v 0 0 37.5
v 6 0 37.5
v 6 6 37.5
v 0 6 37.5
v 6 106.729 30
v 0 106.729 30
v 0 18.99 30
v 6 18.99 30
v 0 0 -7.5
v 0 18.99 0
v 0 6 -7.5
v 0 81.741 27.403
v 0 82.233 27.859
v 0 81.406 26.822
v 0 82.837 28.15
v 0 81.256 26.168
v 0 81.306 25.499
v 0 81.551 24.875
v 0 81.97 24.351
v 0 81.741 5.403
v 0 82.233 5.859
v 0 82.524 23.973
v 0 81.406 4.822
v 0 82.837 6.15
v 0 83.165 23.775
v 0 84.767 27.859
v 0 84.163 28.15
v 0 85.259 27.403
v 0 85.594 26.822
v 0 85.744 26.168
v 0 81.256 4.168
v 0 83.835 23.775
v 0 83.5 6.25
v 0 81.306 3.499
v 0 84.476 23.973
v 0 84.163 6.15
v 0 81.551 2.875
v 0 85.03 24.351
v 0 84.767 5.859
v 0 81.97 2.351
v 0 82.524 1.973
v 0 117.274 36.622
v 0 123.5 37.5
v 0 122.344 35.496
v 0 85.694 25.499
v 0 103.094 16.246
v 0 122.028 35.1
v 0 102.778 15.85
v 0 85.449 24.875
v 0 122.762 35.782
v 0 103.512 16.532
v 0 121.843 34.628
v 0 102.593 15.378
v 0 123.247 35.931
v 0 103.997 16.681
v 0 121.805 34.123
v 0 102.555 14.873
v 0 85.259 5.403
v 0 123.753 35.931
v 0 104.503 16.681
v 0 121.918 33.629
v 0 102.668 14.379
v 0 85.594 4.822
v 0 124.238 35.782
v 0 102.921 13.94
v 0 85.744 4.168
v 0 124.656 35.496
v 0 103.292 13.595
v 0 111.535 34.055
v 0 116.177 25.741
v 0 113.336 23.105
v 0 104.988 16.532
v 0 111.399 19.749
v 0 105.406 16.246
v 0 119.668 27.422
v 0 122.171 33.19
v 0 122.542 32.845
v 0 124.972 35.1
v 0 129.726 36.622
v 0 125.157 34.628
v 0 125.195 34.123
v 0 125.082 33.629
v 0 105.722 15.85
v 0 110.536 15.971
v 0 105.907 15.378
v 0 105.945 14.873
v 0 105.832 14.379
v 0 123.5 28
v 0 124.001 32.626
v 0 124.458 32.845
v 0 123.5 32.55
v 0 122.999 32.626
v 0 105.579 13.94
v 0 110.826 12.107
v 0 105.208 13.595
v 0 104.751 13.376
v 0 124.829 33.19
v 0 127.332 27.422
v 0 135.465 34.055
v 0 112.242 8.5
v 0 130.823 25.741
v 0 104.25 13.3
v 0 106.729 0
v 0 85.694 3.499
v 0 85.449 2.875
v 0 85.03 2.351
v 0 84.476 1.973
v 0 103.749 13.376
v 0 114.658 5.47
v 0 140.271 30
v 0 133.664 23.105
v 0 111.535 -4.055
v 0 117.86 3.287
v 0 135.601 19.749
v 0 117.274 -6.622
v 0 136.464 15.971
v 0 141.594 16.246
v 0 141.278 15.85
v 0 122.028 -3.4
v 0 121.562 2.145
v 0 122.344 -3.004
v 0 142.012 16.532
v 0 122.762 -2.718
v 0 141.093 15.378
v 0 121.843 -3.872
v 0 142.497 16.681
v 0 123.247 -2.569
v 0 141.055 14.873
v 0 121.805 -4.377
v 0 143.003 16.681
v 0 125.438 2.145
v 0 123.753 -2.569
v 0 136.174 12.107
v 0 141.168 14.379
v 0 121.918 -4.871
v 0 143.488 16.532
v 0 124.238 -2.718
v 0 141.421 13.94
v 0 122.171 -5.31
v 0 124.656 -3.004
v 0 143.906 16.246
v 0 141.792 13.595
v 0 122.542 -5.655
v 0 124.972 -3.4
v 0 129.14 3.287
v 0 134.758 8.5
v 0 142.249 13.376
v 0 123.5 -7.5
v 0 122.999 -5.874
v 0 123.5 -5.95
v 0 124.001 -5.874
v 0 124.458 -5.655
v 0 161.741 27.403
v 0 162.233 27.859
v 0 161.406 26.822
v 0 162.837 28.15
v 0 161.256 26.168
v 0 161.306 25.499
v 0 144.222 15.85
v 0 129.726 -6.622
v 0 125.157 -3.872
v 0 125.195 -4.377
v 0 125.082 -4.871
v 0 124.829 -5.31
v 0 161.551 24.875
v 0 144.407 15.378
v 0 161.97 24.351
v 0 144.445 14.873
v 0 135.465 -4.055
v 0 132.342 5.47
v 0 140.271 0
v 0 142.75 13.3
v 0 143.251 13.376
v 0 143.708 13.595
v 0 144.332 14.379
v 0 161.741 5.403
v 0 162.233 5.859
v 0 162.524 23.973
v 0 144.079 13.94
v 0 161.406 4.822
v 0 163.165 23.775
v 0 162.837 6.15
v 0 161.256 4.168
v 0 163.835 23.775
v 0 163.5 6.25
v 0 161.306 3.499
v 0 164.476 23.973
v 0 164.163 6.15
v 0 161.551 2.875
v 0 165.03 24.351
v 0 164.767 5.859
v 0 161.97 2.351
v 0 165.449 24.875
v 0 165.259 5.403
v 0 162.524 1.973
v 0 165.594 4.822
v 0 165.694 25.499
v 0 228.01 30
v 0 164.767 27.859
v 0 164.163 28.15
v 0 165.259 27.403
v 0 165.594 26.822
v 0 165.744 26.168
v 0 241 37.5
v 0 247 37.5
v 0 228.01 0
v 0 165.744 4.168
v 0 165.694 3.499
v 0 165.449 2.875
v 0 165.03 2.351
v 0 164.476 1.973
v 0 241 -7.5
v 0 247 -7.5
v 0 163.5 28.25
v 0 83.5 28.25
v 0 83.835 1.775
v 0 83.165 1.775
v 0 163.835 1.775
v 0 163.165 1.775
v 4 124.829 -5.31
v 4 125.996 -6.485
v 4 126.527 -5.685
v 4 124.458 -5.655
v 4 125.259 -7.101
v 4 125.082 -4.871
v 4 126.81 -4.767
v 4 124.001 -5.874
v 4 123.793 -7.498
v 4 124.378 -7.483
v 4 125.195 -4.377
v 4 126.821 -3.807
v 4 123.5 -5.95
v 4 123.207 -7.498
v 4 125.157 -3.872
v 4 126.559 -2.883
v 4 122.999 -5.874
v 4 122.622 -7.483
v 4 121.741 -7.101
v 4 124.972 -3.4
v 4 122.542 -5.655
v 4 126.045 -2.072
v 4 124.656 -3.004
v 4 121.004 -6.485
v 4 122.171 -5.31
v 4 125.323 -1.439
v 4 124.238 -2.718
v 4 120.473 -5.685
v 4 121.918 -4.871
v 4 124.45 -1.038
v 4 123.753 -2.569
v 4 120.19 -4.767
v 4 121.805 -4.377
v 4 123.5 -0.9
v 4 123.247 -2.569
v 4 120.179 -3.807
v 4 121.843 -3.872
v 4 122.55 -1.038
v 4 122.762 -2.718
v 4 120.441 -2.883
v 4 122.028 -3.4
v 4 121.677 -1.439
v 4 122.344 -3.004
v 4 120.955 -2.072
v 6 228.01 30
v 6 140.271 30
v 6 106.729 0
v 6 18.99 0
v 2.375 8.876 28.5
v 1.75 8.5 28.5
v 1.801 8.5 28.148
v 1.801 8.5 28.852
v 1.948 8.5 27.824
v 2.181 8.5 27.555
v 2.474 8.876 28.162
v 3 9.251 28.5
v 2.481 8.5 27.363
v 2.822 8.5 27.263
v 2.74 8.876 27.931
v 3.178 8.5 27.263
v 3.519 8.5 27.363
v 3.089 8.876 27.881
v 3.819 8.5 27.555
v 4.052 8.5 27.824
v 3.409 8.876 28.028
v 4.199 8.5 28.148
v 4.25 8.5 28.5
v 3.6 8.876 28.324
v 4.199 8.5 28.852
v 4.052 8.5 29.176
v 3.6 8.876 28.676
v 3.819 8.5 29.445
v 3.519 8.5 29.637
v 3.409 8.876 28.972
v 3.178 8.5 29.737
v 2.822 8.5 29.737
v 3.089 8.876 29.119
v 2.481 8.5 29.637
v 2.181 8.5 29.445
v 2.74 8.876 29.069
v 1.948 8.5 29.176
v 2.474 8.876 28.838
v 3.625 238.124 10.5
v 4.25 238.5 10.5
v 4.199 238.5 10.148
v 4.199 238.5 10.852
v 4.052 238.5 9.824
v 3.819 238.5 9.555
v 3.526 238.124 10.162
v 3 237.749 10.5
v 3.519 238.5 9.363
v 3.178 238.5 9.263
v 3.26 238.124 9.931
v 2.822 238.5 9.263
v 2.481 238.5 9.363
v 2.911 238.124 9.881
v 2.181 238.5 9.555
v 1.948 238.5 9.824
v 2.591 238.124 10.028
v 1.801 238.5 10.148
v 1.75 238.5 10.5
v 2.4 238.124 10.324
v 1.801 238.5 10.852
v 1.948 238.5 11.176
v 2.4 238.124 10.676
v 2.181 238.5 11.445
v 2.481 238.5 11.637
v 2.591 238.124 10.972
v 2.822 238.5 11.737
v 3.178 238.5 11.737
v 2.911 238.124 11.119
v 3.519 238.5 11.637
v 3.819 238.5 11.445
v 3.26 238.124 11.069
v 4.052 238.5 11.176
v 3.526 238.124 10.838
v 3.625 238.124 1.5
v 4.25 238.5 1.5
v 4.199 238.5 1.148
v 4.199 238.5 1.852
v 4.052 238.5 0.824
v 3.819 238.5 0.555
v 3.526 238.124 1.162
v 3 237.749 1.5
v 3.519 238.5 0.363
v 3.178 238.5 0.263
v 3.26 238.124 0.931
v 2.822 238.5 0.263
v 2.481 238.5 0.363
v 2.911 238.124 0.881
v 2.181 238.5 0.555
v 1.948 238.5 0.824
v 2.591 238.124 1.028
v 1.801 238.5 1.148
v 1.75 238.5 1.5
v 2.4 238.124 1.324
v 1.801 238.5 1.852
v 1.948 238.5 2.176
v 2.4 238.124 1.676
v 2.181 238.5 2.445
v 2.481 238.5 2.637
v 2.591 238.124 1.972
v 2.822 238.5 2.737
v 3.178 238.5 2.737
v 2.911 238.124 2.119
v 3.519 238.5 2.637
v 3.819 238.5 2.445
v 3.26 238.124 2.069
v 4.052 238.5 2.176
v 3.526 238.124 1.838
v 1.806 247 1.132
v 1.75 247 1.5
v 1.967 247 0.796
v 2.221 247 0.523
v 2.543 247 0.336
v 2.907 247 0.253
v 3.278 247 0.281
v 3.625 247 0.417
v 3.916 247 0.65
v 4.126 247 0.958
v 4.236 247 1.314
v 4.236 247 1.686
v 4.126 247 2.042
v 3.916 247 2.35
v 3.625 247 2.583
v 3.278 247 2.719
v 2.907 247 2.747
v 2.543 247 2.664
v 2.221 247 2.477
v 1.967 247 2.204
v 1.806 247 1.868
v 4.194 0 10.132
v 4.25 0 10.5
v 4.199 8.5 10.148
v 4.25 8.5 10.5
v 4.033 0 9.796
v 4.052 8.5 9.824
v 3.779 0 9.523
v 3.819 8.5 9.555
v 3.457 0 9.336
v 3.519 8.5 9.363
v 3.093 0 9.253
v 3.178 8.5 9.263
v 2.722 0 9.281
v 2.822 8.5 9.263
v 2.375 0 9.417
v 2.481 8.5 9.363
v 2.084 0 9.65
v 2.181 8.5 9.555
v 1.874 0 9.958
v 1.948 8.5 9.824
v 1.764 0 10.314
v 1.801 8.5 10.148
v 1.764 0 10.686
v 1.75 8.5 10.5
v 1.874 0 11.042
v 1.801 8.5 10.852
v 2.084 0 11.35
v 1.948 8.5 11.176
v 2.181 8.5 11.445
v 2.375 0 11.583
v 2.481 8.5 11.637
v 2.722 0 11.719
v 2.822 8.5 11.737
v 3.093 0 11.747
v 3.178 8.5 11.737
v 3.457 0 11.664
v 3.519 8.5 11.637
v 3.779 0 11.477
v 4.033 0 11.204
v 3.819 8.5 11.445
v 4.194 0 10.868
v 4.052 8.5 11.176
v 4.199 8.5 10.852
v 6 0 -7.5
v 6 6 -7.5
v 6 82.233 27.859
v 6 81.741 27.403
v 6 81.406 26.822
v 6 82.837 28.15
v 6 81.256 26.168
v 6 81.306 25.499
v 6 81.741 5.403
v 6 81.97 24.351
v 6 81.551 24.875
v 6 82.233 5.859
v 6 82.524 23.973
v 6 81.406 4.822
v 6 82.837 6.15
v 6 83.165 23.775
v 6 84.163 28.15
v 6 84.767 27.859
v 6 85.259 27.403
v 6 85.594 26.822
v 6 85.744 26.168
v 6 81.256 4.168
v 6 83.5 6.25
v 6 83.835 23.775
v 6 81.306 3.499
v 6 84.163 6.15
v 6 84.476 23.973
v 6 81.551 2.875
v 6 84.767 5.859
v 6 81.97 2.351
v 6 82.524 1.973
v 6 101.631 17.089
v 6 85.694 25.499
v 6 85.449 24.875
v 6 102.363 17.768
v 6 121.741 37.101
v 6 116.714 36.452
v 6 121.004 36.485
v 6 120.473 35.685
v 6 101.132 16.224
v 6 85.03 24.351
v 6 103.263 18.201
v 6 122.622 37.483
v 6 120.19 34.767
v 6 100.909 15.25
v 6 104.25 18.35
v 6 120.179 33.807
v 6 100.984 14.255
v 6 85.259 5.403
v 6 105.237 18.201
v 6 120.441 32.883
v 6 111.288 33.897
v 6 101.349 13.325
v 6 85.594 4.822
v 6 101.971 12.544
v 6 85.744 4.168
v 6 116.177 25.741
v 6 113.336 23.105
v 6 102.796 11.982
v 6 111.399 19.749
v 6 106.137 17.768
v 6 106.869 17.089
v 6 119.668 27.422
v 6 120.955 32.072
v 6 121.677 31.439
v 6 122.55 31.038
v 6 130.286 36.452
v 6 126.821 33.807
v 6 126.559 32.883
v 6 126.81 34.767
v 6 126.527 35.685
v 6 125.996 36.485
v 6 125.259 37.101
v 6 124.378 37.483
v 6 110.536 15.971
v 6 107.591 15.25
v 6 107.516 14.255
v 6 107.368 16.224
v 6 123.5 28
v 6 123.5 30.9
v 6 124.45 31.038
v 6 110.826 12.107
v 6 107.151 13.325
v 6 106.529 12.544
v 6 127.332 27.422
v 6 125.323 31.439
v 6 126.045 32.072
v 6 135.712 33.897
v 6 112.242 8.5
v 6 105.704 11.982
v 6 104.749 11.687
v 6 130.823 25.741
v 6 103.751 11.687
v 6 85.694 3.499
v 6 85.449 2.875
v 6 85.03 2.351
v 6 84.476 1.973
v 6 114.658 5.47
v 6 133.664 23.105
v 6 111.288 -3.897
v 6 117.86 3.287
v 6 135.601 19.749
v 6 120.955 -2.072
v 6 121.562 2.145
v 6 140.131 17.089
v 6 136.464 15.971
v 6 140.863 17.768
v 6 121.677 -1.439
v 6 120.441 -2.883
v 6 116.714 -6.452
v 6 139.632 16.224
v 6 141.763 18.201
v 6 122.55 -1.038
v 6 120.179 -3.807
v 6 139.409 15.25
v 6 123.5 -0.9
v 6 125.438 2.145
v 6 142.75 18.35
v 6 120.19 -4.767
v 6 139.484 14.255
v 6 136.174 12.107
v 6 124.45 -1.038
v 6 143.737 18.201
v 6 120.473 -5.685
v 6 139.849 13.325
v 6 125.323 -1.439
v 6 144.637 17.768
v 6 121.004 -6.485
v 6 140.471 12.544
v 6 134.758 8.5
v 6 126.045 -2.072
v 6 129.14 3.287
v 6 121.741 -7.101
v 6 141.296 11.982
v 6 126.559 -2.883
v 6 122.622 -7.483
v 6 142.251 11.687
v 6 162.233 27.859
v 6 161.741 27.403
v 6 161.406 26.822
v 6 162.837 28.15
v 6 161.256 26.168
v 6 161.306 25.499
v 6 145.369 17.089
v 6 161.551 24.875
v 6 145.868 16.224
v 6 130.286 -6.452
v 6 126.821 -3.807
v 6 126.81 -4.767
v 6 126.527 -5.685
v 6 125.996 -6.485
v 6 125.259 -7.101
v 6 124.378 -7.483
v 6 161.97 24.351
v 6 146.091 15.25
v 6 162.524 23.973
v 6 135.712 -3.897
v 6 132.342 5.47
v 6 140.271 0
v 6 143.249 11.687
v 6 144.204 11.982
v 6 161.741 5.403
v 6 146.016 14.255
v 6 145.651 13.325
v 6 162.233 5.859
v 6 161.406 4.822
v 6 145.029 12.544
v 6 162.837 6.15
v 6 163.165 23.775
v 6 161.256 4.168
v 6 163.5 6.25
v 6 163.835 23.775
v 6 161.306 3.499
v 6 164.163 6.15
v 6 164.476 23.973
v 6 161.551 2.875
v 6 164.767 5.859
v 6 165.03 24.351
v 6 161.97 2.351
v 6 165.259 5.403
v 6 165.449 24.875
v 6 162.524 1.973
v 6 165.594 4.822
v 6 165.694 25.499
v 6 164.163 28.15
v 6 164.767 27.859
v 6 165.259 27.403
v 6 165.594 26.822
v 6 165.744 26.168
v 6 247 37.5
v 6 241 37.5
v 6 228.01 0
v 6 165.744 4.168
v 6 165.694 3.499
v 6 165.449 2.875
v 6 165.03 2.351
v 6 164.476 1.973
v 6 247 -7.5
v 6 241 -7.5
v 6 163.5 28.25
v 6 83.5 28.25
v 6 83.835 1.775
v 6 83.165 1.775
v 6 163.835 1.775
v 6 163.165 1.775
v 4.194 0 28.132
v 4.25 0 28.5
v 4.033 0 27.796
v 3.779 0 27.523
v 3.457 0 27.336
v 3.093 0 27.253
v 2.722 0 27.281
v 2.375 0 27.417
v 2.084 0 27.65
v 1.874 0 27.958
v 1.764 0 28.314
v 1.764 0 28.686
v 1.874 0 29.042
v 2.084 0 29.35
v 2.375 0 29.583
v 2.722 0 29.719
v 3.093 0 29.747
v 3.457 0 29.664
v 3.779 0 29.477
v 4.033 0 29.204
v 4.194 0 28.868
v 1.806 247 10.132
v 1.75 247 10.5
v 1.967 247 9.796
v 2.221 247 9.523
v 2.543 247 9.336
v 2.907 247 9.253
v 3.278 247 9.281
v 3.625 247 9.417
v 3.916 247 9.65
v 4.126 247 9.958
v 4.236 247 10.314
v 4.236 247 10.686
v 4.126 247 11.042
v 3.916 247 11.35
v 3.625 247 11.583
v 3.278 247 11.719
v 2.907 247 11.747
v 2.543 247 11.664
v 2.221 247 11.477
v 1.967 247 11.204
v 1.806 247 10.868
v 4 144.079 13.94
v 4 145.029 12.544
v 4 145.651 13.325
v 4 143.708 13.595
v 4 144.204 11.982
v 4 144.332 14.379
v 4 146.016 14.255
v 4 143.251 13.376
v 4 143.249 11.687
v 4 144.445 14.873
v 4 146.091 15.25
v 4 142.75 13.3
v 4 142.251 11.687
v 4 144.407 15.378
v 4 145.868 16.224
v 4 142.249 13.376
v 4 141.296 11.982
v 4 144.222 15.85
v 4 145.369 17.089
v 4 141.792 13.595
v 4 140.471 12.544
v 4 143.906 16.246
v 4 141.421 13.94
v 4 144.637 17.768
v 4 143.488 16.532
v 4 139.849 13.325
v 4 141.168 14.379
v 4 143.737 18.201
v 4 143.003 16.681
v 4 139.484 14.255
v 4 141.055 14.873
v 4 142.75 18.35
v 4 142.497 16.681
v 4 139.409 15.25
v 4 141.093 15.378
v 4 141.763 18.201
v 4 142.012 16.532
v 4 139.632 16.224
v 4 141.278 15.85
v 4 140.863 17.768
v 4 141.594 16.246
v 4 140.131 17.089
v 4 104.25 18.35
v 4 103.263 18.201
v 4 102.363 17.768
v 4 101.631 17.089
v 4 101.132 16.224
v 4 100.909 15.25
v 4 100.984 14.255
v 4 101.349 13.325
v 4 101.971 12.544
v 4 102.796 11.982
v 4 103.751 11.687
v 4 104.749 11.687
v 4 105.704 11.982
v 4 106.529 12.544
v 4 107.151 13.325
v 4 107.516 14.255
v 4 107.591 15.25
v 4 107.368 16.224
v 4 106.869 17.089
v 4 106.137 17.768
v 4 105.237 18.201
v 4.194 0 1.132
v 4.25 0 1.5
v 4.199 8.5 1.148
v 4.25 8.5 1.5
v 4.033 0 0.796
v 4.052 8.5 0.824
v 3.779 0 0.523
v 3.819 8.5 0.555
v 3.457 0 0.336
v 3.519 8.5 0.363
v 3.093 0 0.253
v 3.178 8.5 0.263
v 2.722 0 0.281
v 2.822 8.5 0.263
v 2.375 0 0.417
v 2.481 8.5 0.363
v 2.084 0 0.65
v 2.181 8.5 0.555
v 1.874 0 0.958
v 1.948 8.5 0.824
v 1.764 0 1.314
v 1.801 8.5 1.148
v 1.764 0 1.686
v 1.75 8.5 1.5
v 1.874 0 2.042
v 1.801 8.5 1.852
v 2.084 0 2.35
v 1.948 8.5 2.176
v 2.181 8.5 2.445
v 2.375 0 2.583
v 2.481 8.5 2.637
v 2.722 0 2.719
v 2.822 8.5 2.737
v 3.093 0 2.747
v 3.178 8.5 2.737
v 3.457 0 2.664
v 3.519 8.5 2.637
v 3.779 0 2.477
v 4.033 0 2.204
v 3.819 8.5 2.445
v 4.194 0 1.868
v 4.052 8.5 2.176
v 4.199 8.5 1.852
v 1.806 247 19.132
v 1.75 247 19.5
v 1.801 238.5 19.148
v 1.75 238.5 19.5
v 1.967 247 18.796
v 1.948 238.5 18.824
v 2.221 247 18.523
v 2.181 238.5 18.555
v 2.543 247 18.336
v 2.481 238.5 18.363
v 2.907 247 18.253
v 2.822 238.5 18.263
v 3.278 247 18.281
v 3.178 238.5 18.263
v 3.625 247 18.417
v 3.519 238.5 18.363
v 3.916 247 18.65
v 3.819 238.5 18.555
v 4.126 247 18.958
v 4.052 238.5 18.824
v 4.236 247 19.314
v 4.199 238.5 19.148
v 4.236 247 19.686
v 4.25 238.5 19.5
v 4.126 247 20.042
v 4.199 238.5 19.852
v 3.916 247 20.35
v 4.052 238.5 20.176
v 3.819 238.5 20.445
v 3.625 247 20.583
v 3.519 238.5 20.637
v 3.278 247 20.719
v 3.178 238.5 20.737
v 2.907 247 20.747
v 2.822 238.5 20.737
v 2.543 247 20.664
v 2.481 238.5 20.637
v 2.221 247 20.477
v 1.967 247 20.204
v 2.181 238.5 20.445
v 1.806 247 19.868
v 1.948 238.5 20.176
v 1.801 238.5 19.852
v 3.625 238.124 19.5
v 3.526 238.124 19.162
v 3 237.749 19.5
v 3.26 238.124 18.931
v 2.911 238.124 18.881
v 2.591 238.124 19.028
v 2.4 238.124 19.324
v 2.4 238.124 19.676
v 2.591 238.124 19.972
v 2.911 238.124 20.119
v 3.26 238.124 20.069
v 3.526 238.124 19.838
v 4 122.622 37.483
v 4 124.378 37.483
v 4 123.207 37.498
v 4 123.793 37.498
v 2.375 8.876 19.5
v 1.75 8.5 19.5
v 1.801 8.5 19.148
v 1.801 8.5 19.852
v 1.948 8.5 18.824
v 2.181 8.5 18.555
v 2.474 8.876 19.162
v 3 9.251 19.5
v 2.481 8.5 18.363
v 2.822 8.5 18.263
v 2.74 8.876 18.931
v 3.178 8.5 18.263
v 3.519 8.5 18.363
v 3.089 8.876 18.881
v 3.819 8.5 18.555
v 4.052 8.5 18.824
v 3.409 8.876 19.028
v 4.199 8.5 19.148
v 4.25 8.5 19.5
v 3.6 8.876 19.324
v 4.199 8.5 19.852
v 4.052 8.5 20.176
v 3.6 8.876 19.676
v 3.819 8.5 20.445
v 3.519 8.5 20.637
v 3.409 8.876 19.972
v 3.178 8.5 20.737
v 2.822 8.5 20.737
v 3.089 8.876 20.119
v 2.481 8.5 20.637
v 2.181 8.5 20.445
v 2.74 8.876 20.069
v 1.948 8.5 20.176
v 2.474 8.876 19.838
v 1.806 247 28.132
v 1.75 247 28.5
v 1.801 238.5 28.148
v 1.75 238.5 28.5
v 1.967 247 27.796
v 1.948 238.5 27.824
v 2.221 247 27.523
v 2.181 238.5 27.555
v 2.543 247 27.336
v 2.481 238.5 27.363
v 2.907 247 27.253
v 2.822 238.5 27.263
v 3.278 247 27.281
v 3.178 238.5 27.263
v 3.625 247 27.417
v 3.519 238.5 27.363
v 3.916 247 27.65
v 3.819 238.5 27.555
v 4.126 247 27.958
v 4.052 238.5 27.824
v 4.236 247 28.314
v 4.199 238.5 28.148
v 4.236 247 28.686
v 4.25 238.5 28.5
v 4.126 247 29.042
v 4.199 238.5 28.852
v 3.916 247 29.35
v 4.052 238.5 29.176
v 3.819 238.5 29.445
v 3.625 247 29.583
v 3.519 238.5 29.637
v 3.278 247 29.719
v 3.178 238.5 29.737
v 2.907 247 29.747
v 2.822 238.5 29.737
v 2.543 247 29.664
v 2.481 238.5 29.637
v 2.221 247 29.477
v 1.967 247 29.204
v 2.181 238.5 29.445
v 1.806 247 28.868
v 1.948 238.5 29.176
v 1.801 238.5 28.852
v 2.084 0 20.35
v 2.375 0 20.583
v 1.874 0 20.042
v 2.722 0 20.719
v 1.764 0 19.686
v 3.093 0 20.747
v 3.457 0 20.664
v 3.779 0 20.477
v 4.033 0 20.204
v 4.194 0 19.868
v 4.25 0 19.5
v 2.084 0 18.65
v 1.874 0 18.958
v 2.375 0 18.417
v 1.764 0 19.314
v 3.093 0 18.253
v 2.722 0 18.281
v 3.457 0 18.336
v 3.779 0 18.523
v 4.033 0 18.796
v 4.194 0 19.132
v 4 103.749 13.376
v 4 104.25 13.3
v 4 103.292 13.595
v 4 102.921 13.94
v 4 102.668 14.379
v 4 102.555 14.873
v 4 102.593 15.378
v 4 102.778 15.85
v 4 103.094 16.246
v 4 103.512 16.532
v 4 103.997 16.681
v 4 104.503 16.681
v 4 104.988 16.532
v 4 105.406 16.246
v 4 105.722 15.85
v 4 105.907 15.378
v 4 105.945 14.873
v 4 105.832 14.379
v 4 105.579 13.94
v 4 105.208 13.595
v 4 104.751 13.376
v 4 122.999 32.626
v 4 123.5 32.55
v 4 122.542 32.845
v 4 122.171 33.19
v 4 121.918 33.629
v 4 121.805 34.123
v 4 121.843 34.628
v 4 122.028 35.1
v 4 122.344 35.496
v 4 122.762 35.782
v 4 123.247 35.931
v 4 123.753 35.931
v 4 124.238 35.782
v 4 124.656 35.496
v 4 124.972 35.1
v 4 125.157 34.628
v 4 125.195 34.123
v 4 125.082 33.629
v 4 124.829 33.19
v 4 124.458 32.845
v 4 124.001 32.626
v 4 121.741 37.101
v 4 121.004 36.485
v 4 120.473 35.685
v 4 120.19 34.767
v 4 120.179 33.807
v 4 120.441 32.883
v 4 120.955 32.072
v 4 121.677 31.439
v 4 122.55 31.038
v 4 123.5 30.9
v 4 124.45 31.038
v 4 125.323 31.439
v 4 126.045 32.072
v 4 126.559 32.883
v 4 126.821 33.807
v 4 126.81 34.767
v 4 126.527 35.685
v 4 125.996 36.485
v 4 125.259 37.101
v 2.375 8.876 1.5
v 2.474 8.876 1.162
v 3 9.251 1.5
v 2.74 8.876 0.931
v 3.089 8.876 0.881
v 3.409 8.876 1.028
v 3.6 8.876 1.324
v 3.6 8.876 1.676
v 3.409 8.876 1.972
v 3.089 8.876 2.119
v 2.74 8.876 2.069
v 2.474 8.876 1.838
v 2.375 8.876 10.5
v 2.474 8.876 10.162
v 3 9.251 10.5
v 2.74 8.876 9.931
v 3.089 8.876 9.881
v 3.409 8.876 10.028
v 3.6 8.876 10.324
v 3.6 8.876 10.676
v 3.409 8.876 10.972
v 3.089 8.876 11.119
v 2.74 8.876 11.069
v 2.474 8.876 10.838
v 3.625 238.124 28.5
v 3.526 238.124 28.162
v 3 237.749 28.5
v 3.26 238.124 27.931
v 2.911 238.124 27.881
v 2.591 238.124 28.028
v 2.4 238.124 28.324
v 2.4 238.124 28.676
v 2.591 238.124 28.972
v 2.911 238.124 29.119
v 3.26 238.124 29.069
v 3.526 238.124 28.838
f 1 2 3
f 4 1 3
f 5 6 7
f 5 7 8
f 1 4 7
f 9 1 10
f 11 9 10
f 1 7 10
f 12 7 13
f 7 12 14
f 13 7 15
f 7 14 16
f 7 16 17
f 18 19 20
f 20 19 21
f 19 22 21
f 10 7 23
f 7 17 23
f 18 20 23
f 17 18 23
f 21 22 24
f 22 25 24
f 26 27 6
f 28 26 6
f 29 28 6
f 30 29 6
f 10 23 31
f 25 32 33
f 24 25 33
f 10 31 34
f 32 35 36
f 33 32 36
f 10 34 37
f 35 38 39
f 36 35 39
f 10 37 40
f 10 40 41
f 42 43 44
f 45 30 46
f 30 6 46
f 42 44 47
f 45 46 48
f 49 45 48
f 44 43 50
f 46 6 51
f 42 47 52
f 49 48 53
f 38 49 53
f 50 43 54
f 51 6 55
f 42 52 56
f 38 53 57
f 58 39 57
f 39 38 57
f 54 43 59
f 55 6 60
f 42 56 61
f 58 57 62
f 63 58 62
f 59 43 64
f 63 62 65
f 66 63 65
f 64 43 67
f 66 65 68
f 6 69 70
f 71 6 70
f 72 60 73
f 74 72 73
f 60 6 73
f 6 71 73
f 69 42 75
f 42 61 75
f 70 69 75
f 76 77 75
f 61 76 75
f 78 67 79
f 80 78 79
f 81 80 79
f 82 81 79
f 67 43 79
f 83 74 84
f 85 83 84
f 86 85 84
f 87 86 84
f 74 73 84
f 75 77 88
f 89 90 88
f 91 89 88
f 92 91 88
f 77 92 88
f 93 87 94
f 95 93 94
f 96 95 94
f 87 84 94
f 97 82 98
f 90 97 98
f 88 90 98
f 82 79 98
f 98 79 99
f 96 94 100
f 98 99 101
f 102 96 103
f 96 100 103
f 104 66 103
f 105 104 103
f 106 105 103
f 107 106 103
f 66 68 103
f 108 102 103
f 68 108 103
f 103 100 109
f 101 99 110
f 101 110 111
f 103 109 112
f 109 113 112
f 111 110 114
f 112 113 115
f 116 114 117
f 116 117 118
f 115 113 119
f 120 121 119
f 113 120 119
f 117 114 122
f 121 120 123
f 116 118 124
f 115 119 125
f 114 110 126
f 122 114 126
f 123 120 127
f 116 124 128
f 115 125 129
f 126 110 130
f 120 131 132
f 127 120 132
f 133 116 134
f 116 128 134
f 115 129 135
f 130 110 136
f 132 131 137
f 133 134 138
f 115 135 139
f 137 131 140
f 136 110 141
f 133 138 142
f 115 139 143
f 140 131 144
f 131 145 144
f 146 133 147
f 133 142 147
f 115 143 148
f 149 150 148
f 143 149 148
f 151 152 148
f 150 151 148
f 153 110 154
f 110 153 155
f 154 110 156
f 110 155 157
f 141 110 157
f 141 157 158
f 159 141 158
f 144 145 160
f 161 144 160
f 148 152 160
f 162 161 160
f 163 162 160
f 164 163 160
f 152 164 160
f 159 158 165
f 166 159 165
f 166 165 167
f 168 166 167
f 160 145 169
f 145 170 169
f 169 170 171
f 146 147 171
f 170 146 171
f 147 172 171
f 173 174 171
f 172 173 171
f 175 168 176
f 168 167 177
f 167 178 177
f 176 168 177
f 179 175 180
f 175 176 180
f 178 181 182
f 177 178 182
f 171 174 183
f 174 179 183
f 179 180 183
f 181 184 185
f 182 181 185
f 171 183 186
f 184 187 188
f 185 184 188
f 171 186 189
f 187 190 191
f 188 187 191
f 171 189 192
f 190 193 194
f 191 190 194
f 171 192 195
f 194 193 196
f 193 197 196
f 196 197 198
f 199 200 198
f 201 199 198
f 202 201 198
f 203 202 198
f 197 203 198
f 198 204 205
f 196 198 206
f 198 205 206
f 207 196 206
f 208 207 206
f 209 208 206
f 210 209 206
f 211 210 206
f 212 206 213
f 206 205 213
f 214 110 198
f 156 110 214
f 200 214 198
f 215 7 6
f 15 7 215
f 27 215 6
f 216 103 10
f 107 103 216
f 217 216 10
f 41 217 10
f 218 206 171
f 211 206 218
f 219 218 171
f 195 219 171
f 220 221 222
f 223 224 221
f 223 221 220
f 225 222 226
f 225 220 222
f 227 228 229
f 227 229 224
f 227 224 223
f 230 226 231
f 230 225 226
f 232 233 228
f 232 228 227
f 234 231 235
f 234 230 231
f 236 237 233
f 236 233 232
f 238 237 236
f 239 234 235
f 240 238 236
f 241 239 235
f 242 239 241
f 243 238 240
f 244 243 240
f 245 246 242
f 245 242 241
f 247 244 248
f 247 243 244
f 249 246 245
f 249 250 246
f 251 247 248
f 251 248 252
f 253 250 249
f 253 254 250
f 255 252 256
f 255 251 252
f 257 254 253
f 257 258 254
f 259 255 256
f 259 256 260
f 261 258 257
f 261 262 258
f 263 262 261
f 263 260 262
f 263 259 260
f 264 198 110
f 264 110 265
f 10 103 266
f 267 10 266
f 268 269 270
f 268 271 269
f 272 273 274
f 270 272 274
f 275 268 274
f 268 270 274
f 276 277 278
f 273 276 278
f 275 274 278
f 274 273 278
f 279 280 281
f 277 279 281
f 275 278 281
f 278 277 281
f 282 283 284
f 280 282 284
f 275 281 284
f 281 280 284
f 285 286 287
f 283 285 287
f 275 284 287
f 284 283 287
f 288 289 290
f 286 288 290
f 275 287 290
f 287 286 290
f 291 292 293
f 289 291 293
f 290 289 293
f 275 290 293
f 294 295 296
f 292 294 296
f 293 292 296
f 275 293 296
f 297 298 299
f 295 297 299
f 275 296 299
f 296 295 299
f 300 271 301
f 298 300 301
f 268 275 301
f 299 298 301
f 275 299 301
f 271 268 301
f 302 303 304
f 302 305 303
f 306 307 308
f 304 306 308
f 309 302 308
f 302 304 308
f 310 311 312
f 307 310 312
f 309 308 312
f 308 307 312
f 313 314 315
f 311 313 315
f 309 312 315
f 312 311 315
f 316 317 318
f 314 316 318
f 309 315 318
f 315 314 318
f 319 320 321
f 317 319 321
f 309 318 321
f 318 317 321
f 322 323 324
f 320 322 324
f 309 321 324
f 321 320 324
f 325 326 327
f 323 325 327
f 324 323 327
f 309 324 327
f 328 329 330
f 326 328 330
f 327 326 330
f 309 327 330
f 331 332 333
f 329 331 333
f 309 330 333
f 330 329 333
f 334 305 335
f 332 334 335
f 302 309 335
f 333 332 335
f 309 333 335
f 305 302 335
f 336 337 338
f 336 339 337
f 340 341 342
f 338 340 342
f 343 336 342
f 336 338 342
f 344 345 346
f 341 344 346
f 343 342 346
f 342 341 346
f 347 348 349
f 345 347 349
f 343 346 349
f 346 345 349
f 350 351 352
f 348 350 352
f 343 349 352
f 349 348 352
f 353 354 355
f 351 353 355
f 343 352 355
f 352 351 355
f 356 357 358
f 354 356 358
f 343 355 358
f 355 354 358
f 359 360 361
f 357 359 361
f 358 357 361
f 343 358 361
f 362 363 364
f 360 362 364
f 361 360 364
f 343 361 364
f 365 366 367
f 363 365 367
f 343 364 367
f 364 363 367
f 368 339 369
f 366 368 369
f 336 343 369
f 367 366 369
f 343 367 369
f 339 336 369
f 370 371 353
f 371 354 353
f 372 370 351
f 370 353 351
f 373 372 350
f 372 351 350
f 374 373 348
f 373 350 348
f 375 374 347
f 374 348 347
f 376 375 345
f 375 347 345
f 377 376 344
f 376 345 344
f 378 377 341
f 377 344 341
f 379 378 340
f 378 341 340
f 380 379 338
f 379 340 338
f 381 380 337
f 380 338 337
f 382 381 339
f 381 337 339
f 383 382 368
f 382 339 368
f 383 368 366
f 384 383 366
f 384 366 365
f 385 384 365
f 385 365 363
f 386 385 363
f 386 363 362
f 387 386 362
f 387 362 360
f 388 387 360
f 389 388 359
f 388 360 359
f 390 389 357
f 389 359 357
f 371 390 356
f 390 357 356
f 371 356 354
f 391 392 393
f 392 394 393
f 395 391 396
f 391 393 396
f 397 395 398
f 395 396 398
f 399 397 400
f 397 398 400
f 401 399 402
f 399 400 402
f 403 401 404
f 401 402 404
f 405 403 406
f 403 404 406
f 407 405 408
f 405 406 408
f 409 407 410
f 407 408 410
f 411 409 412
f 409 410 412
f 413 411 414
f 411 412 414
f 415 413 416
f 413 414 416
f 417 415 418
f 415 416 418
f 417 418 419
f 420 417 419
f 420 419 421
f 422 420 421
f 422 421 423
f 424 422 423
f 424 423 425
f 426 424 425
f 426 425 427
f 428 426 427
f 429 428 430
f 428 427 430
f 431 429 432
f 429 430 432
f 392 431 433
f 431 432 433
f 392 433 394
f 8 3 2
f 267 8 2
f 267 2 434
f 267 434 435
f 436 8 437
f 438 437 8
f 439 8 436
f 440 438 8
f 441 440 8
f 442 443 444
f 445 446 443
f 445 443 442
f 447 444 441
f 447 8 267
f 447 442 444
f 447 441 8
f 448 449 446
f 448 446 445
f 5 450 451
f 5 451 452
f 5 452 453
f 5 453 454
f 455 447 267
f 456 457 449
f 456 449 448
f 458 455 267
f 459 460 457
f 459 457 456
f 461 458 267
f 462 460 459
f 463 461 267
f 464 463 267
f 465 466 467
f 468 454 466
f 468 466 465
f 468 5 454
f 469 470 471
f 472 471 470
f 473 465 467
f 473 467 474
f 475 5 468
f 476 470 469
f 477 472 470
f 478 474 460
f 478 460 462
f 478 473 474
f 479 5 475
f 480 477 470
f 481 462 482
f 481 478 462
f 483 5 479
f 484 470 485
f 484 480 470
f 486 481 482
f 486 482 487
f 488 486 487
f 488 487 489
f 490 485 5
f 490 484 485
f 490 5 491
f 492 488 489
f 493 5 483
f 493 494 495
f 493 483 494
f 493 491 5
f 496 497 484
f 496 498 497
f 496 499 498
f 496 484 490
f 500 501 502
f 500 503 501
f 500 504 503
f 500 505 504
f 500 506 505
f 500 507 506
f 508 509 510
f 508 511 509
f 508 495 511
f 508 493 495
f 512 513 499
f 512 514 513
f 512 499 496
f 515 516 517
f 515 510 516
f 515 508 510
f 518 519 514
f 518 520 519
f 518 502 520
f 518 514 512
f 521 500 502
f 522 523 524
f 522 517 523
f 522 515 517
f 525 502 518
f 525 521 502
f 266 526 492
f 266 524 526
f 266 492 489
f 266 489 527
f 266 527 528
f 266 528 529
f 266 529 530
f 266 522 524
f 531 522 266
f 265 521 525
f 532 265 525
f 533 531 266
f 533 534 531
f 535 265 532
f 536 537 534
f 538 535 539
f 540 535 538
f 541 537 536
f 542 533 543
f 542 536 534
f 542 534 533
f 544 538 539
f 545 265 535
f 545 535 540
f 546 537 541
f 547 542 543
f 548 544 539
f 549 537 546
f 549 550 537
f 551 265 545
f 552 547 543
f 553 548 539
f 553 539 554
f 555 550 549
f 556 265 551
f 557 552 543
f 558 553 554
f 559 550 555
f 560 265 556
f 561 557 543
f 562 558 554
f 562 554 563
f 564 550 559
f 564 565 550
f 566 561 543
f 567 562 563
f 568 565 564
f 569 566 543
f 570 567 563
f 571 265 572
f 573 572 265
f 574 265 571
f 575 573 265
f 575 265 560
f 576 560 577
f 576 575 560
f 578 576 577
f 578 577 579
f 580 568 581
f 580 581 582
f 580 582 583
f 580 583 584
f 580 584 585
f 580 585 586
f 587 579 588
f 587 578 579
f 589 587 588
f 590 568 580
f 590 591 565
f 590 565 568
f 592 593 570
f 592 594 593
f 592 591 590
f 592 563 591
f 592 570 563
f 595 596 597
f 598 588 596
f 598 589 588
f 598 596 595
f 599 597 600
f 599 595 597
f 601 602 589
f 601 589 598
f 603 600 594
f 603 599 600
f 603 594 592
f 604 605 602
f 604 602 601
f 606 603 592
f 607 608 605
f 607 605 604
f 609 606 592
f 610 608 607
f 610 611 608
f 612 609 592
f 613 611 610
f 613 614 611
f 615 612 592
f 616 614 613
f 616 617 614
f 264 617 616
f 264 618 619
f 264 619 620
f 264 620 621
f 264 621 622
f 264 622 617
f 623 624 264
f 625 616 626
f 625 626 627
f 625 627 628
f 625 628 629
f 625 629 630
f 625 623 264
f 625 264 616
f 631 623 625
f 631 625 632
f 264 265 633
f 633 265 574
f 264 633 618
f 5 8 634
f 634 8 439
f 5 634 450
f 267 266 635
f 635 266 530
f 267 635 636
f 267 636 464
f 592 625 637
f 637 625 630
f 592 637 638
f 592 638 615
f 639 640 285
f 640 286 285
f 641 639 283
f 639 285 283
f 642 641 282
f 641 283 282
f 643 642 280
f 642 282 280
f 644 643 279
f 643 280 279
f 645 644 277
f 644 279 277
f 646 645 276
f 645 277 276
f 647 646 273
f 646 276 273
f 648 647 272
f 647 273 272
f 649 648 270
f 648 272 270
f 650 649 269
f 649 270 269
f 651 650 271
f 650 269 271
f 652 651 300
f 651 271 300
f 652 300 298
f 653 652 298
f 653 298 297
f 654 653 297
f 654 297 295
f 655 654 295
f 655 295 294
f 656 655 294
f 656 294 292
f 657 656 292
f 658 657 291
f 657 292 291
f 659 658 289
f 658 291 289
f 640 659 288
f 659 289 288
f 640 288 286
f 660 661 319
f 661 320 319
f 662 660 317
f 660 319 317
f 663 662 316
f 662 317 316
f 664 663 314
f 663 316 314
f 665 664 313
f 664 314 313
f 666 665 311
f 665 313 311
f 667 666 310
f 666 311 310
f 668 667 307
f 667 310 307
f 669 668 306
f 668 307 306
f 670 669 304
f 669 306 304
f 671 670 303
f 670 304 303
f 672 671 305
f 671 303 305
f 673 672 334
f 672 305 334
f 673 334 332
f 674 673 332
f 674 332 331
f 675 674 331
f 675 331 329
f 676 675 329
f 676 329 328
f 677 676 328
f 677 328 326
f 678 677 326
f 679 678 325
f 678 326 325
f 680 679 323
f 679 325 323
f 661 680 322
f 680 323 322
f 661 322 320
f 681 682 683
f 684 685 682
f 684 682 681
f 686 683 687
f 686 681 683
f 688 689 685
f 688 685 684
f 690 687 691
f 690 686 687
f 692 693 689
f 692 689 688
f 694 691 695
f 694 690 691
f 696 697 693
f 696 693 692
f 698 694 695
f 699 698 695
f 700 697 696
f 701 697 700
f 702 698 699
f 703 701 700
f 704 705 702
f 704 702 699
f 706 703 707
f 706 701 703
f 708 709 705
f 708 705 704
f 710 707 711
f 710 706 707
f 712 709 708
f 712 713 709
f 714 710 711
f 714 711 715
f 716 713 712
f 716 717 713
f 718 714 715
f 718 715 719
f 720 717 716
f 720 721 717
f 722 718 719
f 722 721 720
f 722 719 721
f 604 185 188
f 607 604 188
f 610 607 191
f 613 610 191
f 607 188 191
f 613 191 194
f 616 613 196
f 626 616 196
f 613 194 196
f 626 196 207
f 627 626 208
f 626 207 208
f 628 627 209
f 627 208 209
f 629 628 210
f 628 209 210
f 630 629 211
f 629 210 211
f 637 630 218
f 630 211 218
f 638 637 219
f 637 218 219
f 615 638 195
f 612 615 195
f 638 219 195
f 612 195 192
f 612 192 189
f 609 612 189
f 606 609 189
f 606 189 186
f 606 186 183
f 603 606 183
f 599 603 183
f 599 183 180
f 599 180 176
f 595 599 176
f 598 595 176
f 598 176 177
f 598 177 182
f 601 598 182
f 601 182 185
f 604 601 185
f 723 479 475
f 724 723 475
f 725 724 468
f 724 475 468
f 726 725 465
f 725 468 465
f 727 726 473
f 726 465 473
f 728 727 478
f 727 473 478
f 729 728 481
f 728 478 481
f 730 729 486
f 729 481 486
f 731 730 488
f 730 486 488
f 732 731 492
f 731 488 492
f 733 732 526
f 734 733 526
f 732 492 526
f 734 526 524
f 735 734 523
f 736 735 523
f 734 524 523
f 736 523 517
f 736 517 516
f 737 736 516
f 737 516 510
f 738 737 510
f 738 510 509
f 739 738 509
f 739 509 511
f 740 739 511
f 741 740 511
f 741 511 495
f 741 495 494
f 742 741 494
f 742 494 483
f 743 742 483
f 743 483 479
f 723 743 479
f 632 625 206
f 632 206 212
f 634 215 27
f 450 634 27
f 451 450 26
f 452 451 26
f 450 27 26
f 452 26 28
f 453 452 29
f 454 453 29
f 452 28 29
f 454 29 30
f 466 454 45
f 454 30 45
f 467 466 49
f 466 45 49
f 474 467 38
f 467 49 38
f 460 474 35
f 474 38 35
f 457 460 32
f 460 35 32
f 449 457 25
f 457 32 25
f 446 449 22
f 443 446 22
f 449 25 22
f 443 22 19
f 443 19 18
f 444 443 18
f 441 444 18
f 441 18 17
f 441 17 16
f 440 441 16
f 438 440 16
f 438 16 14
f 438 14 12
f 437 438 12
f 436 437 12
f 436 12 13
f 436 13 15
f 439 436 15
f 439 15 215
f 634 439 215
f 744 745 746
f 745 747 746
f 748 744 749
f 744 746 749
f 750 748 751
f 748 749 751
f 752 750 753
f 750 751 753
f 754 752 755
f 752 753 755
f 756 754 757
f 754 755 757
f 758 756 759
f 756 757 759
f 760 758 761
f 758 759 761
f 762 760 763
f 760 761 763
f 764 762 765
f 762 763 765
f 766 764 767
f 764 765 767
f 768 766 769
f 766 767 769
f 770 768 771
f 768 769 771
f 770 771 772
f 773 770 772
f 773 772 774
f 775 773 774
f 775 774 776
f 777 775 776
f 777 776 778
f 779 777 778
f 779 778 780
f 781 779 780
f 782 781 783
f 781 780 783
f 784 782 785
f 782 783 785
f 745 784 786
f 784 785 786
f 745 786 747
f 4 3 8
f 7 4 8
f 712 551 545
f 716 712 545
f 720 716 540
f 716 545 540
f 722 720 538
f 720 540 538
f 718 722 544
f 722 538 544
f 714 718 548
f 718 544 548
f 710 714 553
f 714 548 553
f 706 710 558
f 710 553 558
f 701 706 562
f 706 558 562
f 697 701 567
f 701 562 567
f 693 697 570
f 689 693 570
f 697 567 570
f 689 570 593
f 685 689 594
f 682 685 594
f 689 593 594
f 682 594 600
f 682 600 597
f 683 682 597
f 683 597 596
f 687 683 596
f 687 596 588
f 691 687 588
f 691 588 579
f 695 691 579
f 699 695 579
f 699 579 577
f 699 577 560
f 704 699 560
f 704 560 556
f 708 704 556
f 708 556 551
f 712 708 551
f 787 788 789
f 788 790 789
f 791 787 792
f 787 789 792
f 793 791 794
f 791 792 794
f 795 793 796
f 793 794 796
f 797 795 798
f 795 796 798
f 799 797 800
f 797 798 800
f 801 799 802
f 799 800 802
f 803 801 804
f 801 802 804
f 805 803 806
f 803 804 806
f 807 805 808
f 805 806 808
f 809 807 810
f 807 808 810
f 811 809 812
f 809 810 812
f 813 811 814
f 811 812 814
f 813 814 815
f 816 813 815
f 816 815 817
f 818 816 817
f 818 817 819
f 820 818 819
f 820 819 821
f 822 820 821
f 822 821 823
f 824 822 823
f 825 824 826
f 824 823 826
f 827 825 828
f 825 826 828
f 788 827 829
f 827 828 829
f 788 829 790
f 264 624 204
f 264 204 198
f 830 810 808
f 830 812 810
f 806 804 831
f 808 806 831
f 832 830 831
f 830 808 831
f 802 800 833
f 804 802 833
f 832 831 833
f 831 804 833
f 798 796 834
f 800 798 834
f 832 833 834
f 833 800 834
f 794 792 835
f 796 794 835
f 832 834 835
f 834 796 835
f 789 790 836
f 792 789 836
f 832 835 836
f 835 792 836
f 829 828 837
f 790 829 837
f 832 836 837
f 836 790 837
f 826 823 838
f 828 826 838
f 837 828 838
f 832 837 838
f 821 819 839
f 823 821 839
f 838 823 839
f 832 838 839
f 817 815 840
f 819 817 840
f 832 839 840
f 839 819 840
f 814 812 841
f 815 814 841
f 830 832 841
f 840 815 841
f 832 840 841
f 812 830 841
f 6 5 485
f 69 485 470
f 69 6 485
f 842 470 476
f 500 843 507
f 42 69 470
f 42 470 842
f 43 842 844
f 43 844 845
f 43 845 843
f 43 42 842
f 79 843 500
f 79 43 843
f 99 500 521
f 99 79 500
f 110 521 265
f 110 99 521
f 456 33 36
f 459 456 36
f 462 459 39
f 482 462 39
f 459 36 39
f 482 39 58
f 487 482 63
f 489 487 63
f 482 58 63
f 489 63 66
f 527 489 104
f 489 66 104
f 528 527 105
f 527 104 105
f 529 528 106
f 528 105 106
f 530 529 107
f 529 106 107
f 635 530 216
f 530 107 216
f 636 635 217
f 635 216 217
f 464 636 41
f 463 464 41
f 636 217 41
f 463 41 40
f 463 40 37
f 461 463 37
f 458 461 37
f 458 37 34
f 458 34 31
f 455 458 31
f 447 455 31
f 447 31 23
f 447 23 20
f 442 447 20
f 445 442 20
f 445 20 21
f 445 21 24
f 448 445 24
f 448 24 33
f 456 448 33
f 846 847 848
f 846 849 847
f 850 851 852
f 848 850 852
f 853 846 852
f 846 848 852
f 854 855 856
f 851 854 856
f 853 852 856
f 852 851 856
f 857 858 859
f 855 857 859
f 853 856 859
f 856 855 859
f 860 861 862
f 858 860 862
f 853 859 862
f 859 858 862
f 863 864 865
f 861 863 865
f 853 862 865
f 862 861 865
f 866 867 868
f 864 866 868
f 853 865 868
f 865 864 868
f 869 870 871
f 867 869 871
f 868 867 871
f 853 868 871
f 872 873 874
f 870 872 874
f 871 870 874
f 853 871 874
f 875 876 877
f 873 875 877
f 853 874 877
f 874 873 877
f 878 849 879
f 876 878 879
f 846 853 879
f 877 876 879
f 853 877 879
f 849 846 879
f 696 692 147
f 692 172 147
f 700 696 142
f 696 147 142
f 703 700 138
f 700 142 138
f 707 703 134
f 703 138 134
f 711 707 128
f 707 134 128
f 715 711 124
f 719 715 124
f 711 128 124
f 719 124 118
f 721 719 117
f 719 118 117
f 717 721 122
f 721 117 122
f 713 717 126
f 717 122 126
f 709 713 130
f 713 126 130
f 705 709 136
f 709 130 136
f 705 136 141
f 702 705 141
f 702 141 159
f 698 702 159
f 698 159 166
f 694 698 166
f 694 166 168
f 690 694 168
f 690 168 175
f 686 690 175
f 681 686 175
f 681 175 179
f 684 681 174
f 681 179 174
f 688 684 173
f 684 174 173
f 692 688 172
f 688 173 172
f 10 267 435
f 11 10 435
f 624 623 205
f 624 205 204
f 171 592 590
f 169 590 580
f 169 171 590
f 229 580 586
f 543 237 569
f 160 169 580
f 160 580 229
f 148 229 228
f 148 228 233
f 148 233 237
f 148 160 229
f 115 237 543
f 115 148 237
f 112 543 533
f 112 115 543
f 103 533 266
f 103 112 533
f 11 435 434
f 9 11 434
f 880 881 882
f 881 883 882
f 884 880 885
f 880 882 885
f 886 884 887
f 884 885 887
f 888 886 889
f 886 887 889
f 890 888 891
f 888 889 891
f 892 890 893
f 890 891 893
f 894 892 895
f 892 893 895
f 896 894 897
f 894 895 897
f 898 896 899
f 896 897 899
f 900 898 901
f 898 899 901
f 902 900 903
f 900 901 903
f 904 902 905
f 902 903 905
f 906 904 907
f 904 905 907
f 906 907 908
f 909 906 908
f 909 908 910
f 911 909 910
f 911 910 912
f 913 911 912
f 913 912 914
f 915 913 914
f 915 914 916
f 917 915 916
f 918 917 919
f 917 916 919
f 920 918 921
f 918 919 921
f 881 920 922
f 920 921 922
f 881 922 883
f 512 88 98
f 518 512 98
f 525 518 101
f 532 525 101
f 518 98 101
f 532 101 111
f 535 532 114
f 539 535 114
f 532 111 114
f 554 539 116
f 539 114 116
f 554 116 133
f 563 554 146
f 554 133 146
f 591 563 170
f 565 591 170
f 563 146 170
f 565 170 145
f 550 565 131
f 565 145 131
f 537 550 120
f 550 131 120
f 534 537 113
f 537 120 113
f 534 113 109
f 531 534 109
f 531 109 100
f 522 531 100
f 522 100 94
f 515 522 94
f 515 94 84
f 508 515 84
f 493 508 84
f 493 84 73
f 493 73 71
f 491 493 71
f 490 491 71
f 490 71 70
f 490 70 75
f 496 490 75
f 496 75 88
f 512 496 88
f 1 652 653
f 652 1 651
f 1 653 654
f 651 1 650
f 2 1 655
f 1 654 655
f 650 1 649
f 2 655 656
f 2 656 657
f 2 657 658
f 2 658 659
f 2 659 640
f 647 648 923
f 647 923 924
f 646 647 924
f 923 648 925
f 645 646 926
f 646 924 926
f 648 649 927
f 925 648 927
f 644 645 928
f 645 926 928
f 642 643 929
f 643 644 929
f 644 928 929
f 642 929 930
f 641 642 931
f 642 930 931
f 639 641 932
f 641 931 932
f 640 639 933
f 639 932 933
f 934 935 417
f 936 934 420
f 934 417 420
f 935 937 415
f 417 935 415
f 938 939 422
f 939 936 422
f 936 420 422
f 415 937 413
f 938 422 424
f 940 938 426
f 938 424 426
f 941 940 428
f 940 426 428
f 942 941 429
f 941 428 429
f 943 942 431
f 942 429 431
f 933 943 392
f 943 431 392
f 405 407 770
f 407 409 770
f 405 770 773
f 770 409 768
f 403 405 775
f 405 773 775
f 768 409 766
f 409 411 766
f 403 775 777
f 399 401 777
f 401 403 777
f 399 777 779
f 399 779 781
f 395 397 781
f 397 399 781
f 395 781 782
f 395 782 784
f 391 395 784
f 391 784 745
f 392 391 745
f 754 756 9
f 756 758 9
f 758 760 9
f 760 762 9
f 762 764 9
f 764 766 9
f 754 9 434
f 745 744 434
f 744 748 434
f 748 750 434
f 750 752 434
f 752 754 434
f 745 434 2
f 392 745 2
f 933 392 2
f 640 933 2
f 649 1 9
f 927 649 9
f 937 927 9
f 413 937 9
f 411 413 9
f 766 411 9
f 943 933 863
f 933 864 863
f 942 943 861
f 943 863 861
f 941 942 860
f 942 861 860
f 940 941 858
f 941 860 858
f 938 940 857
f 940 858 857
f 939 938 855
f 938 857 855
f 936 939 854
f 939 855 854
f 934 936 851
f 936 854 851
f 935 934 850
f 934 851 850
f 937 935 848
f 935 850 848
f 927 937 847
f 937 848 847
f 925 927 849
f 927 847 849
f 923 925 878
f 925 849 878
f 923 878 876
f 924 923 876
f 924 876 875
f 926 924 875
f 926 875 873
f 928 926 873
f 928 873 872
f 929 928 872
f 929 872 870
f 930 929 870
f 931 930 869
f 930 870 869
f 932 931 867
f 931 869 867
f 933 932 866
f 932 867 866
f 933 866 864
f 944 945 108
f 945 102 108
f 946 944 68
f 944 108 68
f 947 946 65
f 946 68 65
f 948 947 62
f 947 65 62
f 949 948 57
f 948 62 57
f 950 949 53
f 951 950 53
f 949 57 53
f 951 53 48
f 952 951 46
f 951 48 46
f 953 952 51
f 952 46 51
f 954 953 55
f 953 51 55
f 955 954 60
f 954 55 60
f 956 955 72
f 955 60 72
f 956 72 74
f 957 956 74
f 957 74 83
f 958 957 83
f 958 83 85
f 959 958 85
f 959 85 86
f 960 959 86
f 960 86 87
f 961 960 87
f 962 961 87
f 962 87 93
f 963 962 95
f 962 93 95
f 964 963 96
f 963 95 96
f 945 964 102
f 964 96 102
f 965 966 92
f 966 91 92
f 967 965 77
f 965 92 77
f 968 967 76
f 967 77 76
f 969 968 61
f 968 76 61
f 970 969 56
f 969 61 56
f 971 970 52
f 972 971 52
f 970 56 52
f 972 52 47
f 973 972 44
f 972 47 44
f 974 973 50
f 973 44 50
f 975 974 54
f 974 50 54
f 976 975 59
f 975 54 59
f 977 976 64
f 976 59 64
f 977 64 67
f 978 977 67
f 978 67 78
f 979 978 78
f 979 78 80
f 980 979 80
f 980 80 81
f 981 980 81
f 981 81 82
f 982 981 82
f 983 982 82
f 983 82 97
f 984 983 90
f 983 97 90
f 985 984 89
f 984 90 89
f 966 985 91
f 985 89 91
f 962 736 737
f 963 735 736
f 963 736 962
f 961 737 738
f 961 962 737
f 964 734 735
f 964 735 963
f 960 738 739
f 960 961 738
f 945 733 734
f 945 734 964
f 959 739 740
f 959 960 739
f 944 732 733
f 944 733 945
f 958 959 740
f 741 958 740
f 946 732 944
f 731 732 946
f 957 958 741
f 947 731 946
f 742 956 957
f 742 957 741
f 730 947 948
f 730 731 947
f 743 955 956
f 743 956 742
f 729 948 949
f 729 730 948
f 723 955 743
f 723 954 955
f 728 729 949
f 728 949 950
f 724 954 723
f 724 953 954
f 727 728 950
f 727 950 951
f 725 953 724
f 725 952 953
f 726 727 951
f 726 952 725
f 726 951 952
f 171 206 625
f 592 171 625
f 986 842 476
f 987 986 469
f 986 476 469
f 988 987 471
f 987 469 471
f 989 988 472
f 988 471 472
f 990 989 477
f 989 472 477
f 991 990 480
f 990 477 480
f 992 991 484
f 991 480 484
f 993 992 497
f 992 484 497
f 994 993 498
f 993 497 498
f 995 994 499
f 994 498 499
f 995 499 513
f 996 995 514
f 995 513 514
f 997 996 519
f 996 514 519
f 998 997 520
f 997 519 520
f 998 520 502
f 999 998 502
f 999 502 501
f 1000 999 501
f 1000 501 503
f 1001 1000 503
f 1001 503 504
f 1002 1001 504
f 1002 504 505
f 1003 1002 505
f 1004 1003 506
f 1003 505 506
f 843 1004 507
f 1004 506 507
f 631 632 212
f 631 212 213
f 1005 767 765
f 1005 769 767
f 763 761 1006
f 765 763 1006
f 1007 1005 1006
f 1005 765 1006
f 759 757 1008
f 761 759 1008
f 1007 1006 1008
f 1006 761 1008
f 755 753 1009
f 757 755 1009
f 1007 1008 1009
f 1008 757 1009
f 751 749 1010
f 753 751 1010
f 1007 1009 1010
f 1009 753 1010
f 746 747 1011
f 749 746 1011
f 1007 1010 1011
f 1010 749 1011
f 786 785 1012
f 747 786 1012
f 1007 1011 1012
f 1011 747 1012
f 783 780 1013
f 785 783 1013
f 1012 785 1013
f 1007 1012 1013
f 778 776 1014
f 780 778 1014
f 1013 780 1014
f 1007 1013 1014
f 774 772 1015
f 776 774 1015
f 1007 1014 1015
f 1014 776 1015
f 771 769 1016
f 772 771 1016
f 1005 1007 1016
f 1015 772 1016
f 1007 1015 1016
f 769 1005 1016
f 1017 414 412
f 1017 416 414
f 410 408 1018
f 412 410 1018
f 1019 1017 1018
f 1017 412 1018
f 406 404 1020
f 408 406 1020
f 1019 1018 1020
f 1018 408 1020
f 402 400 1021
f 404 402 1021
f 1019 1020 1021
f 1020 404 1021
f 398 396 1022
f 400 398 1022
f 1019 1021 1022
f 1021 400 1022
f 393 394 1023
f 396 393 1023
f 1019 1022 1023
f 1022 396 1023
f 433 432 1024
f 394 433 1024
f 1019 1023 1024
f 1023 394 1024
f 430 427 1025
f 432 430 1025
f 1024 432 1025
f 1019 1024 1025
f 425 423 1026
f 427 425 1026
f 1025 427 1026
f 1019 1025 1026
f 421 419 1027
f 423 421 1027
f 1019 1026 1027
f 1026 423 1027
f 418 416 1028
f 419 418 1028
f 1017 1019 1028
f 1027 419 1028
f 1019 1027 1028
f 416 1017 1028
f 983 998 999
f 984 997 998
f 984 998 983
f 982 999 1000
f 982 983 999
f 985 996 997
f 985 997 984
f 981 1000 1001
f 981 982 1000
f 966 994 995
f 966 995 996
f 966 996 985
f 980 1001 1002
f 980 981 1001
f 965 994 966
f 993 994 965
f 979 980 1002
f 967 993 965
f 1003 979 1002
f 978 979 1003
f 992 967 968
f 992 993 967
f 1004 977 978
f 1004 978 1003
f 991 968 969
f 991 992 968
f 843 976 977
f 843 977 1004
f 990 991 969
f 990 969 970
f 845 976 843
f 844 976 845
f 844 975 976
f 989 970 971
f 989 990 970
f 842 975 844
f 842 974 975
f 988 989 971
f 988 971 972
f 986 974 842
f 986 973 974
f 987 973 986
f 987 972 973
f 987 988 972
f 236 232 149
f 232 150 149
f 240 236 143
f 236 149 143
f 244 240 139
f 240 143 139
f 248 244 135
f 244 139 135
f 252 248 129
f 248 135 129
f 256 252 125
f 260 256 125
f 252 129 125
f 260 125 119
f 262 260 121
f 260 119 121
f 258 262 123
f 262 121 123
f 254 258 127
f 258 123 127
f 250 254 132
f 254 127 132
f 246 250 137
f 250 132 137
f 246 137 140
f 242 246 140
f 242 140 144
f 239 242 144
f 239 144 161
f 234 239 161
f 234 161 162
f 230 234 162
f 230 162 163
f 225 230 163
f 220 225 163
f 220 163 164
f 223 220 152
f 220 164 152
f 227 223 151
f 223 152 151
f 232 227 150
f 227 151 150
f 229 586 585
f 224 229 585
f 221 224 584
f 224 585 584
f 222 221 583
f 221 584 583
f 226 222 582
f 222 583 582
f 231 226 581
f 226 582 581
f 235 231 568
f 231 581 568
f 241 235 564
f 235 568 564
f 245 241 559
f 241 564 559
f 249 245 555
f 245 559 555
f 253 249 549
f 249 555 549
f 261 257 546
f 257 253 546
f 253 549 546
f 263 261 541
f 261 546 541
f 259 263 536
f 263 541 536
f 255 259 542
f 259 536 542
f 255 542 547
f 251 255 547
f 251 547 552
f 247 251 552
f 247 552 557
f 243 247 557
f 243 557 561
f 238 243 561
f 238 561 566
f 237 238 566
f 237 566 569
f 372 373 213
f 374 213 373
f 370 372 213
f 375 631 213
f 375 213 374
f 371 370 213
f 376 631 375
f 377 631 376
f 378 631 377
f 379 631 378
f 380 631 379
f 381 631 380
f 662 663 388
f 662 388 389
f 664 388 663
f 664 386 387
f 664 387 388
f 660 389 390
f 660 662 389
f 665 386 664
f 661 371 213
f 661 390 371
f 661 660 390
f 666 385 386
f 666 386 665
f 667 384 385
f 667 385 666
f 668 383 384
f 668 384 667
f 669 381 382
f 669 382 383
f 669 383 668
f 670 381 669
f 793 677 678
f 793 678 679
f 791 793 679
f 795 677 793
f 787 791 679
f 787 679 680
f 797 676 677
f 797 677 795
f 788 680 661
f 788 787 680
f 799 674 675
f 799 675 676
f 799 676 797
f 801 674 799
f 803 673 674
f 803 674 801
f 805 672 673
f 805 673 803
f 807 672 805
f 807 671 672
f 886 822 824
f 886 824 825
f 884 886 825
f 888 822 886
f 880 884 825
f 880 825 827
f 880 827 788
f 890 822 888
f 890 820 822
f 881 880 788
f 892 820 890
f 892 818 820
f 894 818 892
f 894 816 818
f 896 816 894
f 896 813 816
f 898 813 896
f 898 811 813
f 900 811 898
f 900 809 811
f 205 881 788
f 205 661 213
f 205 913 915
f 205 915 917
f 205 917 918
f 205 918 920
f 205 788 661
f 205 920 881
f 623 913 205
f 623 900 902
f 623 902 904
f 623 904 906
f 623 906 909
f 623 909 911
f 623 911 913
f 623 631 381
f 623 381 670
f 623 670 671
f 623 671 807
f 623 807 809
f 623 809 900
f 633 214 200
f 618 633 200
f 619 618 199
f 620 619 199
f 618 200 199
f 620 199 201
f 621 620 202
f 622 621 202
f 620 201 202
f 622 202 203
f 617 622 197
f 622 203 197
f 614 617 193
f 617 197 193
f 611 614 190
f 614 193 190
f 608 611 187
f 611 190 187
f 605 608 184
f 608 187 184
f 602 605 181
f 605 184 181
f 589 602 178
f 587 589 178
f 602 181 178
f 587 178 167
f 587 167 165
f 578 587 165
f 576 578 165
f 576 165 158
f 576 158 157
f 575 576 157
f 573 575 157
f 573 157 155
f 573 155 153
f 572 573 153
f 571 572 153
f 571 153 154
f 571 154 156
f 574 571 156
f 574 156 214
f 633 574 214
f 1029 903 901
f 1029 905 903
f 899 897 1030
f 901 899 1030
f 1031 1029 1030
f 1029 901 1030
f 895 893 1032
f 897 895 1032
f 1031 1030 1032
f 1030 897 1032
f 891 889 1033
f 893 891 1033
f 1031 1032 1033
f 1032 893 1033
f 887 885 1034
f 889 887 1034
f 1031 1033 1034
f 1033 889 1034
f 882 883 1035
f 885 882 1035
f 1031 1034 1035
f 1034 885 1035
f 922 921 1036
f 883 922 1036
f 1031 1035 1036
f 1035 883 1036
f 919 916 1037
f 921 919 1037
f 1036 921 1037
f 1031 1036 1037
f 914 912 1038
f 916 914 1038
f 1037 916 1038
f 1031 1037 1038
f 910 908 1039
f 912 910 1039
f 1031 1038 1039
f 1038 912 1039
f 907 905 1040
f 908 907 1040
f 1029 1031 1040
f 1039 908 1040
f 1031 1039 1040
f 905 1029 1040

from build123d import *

# Parameters (mm, degrees)
SKETCH_1_W                  = 6
SKETCH_1_H                  = 30
EXTRUDE_1_DEPTH             = 247
SKETCH_2_R                  = 22.5
EXTRUDE_2_DEPTH             = 6
SKETCH_3_R                  = 13
CUT_EXTRUDE_1_DEPTH         = 250.90248098
HOLE_WIZARD_M31_D           = 3.4
HOLE_WIZARD_M31_CBORE_D     = 6.7
HOLE_WIZARD_M31_CBORE_DEPTH = 2
HOLE_WIZARD_M41_D           = 4.5
EXTRUDE_3_DEPTH             = 6
M3X0_51_D                   = 2.5
M3X0_51_DEPTH               = 8.5
M3X0_51_TIP                 = 0.751075774
M3X0_52_D                   = 2.5
M3X0_52_DEPTH               = 8.5
M3X0_52_TIP                 = 0.751075774


with BuildPart() as part:
    # Эскиз1 → Бобышка-Вытянуть1 (new body)
    with BuildSketch(Plane(origin=(0, 0, 0), x_dir=(1, 0, 0), z_dir=(0, 1, 0))):
        with Locations((3, -15)):
            Rectangle(SKETCH_1_W, SKETCH_1_H)
    extrude(amount=EXTRUDE_1_DEPTH)

    # Эскиз2 → Бобышка-Вытянуть2 (add)
    with BuildSketch(Plane.ZY):
        with Locations((15, 123.5)):
            Circle(SKETCH_2_R)
    extrude(amount=-EXTRUDE_2_DEPTH)

    # Эскиз3 → Вырез-Вытянуть1 (cut, through all)
    with BuildSketch(Plane.ZY):
        with Locations((15, 123.5)):
            Circle(SKETCH_3_R)
    extrude(amount=-CUT_EXTRUDE_1_DEPTH, mode=Mode.SUBTRACT)

    # Цековка для  винта с полукруглой головкой M31 (through all)
    with Locations(Plane(origin=(6, -25.024735225, 7.262908886), x_dir=(0, 0, 1), z_dir=(1, 0, 0))):
        with Locations((7.737091114, -167.774735225), (-11.512908886, -148.524735225), (7.737091114, -129.274735225), (26.987091114, -148.524735225)):
            CounterBoreHole(HOLE_WIZARD_M31_D / 2, HOLE_WIZARD_M31_CBORE_D / 2, HOLE_WIZARD_M31_CBORE_DEPTH)

    # Отверстие с зазором M41 (through all)
    with Locations(Plane(origin=(6, 0, 0), x_dir=(0, 0, -1), z_dir=(1, 0, 0))):
        with Locations((-26, 163.5), (-4, 163.5), (-4, 83.5), (-26, 83.5)):
            Hole(HOLE_WIZARD_M41_D / 2)

    # Эскиз11 → Бобышка-Вытянуть3 (add)
    with BuildSketch(Plane(origin=(6, 0, 0), x_dir=(0, 0, -1), z_dir=(1, 0, 0))):
        Polygon((-37.5, 241), (-30, 228.009618943), (0, 228.009618943), (7.5, 241), (7.5, 247), (-37.5, 247), align=None)
        Polygon((0, 18.990381057), (7.5, 6), (7.5, 0), (-37.5, 0), (-37.5, 6), (-30, 18.990381057), align=None)
    extrude(amount=-EXTRUDE_3_DEPTH)

    # Отверстие обработанное метчиком M3x0.51
    with Locations(Plane(origin=(0, 0, 0), x_dir=(-1, 0, 0), z_dir=(0, -1, 0))):
        with Locations((-3, -28.5), (-3, -19.5), (-3, -10.5), (-3, -1.5)):
            Hole(M3X0_51_D / 2, depth=M3X0_51_DEPTH)
            with Locations((0, 0, -(M3X0_51_DEPTH + M3X0_51_TIP / 2))):  # 118° drill point
                Cone(0, M3X0_51_D / 2, M3X0_51_TIP, mode=Mode.SUBTRACT)

    # Отверстие обработанное метчиком M3x0.52
    with Locations(Plane(origin=(0, 247, 0), x_dir=(1, 0, 0), z_dir=(0, 1, 0))):
        with Locations((3, -1.5), (3, -10.5), (3, -19.5), (3, -28.5)):
            Hole(M3X0_52_D / 2, depth=M3X0_52_DEPTH)
            with Locations((0, 0, -(M3X0_52_DEPTH + M3X0_52_TIP / 2))):  # 118° drill point
                Cone(0, M3X0_52_D / 2, M3X0_52_TIP, mode=Mode.SUBTRACT)


solid = part.part
